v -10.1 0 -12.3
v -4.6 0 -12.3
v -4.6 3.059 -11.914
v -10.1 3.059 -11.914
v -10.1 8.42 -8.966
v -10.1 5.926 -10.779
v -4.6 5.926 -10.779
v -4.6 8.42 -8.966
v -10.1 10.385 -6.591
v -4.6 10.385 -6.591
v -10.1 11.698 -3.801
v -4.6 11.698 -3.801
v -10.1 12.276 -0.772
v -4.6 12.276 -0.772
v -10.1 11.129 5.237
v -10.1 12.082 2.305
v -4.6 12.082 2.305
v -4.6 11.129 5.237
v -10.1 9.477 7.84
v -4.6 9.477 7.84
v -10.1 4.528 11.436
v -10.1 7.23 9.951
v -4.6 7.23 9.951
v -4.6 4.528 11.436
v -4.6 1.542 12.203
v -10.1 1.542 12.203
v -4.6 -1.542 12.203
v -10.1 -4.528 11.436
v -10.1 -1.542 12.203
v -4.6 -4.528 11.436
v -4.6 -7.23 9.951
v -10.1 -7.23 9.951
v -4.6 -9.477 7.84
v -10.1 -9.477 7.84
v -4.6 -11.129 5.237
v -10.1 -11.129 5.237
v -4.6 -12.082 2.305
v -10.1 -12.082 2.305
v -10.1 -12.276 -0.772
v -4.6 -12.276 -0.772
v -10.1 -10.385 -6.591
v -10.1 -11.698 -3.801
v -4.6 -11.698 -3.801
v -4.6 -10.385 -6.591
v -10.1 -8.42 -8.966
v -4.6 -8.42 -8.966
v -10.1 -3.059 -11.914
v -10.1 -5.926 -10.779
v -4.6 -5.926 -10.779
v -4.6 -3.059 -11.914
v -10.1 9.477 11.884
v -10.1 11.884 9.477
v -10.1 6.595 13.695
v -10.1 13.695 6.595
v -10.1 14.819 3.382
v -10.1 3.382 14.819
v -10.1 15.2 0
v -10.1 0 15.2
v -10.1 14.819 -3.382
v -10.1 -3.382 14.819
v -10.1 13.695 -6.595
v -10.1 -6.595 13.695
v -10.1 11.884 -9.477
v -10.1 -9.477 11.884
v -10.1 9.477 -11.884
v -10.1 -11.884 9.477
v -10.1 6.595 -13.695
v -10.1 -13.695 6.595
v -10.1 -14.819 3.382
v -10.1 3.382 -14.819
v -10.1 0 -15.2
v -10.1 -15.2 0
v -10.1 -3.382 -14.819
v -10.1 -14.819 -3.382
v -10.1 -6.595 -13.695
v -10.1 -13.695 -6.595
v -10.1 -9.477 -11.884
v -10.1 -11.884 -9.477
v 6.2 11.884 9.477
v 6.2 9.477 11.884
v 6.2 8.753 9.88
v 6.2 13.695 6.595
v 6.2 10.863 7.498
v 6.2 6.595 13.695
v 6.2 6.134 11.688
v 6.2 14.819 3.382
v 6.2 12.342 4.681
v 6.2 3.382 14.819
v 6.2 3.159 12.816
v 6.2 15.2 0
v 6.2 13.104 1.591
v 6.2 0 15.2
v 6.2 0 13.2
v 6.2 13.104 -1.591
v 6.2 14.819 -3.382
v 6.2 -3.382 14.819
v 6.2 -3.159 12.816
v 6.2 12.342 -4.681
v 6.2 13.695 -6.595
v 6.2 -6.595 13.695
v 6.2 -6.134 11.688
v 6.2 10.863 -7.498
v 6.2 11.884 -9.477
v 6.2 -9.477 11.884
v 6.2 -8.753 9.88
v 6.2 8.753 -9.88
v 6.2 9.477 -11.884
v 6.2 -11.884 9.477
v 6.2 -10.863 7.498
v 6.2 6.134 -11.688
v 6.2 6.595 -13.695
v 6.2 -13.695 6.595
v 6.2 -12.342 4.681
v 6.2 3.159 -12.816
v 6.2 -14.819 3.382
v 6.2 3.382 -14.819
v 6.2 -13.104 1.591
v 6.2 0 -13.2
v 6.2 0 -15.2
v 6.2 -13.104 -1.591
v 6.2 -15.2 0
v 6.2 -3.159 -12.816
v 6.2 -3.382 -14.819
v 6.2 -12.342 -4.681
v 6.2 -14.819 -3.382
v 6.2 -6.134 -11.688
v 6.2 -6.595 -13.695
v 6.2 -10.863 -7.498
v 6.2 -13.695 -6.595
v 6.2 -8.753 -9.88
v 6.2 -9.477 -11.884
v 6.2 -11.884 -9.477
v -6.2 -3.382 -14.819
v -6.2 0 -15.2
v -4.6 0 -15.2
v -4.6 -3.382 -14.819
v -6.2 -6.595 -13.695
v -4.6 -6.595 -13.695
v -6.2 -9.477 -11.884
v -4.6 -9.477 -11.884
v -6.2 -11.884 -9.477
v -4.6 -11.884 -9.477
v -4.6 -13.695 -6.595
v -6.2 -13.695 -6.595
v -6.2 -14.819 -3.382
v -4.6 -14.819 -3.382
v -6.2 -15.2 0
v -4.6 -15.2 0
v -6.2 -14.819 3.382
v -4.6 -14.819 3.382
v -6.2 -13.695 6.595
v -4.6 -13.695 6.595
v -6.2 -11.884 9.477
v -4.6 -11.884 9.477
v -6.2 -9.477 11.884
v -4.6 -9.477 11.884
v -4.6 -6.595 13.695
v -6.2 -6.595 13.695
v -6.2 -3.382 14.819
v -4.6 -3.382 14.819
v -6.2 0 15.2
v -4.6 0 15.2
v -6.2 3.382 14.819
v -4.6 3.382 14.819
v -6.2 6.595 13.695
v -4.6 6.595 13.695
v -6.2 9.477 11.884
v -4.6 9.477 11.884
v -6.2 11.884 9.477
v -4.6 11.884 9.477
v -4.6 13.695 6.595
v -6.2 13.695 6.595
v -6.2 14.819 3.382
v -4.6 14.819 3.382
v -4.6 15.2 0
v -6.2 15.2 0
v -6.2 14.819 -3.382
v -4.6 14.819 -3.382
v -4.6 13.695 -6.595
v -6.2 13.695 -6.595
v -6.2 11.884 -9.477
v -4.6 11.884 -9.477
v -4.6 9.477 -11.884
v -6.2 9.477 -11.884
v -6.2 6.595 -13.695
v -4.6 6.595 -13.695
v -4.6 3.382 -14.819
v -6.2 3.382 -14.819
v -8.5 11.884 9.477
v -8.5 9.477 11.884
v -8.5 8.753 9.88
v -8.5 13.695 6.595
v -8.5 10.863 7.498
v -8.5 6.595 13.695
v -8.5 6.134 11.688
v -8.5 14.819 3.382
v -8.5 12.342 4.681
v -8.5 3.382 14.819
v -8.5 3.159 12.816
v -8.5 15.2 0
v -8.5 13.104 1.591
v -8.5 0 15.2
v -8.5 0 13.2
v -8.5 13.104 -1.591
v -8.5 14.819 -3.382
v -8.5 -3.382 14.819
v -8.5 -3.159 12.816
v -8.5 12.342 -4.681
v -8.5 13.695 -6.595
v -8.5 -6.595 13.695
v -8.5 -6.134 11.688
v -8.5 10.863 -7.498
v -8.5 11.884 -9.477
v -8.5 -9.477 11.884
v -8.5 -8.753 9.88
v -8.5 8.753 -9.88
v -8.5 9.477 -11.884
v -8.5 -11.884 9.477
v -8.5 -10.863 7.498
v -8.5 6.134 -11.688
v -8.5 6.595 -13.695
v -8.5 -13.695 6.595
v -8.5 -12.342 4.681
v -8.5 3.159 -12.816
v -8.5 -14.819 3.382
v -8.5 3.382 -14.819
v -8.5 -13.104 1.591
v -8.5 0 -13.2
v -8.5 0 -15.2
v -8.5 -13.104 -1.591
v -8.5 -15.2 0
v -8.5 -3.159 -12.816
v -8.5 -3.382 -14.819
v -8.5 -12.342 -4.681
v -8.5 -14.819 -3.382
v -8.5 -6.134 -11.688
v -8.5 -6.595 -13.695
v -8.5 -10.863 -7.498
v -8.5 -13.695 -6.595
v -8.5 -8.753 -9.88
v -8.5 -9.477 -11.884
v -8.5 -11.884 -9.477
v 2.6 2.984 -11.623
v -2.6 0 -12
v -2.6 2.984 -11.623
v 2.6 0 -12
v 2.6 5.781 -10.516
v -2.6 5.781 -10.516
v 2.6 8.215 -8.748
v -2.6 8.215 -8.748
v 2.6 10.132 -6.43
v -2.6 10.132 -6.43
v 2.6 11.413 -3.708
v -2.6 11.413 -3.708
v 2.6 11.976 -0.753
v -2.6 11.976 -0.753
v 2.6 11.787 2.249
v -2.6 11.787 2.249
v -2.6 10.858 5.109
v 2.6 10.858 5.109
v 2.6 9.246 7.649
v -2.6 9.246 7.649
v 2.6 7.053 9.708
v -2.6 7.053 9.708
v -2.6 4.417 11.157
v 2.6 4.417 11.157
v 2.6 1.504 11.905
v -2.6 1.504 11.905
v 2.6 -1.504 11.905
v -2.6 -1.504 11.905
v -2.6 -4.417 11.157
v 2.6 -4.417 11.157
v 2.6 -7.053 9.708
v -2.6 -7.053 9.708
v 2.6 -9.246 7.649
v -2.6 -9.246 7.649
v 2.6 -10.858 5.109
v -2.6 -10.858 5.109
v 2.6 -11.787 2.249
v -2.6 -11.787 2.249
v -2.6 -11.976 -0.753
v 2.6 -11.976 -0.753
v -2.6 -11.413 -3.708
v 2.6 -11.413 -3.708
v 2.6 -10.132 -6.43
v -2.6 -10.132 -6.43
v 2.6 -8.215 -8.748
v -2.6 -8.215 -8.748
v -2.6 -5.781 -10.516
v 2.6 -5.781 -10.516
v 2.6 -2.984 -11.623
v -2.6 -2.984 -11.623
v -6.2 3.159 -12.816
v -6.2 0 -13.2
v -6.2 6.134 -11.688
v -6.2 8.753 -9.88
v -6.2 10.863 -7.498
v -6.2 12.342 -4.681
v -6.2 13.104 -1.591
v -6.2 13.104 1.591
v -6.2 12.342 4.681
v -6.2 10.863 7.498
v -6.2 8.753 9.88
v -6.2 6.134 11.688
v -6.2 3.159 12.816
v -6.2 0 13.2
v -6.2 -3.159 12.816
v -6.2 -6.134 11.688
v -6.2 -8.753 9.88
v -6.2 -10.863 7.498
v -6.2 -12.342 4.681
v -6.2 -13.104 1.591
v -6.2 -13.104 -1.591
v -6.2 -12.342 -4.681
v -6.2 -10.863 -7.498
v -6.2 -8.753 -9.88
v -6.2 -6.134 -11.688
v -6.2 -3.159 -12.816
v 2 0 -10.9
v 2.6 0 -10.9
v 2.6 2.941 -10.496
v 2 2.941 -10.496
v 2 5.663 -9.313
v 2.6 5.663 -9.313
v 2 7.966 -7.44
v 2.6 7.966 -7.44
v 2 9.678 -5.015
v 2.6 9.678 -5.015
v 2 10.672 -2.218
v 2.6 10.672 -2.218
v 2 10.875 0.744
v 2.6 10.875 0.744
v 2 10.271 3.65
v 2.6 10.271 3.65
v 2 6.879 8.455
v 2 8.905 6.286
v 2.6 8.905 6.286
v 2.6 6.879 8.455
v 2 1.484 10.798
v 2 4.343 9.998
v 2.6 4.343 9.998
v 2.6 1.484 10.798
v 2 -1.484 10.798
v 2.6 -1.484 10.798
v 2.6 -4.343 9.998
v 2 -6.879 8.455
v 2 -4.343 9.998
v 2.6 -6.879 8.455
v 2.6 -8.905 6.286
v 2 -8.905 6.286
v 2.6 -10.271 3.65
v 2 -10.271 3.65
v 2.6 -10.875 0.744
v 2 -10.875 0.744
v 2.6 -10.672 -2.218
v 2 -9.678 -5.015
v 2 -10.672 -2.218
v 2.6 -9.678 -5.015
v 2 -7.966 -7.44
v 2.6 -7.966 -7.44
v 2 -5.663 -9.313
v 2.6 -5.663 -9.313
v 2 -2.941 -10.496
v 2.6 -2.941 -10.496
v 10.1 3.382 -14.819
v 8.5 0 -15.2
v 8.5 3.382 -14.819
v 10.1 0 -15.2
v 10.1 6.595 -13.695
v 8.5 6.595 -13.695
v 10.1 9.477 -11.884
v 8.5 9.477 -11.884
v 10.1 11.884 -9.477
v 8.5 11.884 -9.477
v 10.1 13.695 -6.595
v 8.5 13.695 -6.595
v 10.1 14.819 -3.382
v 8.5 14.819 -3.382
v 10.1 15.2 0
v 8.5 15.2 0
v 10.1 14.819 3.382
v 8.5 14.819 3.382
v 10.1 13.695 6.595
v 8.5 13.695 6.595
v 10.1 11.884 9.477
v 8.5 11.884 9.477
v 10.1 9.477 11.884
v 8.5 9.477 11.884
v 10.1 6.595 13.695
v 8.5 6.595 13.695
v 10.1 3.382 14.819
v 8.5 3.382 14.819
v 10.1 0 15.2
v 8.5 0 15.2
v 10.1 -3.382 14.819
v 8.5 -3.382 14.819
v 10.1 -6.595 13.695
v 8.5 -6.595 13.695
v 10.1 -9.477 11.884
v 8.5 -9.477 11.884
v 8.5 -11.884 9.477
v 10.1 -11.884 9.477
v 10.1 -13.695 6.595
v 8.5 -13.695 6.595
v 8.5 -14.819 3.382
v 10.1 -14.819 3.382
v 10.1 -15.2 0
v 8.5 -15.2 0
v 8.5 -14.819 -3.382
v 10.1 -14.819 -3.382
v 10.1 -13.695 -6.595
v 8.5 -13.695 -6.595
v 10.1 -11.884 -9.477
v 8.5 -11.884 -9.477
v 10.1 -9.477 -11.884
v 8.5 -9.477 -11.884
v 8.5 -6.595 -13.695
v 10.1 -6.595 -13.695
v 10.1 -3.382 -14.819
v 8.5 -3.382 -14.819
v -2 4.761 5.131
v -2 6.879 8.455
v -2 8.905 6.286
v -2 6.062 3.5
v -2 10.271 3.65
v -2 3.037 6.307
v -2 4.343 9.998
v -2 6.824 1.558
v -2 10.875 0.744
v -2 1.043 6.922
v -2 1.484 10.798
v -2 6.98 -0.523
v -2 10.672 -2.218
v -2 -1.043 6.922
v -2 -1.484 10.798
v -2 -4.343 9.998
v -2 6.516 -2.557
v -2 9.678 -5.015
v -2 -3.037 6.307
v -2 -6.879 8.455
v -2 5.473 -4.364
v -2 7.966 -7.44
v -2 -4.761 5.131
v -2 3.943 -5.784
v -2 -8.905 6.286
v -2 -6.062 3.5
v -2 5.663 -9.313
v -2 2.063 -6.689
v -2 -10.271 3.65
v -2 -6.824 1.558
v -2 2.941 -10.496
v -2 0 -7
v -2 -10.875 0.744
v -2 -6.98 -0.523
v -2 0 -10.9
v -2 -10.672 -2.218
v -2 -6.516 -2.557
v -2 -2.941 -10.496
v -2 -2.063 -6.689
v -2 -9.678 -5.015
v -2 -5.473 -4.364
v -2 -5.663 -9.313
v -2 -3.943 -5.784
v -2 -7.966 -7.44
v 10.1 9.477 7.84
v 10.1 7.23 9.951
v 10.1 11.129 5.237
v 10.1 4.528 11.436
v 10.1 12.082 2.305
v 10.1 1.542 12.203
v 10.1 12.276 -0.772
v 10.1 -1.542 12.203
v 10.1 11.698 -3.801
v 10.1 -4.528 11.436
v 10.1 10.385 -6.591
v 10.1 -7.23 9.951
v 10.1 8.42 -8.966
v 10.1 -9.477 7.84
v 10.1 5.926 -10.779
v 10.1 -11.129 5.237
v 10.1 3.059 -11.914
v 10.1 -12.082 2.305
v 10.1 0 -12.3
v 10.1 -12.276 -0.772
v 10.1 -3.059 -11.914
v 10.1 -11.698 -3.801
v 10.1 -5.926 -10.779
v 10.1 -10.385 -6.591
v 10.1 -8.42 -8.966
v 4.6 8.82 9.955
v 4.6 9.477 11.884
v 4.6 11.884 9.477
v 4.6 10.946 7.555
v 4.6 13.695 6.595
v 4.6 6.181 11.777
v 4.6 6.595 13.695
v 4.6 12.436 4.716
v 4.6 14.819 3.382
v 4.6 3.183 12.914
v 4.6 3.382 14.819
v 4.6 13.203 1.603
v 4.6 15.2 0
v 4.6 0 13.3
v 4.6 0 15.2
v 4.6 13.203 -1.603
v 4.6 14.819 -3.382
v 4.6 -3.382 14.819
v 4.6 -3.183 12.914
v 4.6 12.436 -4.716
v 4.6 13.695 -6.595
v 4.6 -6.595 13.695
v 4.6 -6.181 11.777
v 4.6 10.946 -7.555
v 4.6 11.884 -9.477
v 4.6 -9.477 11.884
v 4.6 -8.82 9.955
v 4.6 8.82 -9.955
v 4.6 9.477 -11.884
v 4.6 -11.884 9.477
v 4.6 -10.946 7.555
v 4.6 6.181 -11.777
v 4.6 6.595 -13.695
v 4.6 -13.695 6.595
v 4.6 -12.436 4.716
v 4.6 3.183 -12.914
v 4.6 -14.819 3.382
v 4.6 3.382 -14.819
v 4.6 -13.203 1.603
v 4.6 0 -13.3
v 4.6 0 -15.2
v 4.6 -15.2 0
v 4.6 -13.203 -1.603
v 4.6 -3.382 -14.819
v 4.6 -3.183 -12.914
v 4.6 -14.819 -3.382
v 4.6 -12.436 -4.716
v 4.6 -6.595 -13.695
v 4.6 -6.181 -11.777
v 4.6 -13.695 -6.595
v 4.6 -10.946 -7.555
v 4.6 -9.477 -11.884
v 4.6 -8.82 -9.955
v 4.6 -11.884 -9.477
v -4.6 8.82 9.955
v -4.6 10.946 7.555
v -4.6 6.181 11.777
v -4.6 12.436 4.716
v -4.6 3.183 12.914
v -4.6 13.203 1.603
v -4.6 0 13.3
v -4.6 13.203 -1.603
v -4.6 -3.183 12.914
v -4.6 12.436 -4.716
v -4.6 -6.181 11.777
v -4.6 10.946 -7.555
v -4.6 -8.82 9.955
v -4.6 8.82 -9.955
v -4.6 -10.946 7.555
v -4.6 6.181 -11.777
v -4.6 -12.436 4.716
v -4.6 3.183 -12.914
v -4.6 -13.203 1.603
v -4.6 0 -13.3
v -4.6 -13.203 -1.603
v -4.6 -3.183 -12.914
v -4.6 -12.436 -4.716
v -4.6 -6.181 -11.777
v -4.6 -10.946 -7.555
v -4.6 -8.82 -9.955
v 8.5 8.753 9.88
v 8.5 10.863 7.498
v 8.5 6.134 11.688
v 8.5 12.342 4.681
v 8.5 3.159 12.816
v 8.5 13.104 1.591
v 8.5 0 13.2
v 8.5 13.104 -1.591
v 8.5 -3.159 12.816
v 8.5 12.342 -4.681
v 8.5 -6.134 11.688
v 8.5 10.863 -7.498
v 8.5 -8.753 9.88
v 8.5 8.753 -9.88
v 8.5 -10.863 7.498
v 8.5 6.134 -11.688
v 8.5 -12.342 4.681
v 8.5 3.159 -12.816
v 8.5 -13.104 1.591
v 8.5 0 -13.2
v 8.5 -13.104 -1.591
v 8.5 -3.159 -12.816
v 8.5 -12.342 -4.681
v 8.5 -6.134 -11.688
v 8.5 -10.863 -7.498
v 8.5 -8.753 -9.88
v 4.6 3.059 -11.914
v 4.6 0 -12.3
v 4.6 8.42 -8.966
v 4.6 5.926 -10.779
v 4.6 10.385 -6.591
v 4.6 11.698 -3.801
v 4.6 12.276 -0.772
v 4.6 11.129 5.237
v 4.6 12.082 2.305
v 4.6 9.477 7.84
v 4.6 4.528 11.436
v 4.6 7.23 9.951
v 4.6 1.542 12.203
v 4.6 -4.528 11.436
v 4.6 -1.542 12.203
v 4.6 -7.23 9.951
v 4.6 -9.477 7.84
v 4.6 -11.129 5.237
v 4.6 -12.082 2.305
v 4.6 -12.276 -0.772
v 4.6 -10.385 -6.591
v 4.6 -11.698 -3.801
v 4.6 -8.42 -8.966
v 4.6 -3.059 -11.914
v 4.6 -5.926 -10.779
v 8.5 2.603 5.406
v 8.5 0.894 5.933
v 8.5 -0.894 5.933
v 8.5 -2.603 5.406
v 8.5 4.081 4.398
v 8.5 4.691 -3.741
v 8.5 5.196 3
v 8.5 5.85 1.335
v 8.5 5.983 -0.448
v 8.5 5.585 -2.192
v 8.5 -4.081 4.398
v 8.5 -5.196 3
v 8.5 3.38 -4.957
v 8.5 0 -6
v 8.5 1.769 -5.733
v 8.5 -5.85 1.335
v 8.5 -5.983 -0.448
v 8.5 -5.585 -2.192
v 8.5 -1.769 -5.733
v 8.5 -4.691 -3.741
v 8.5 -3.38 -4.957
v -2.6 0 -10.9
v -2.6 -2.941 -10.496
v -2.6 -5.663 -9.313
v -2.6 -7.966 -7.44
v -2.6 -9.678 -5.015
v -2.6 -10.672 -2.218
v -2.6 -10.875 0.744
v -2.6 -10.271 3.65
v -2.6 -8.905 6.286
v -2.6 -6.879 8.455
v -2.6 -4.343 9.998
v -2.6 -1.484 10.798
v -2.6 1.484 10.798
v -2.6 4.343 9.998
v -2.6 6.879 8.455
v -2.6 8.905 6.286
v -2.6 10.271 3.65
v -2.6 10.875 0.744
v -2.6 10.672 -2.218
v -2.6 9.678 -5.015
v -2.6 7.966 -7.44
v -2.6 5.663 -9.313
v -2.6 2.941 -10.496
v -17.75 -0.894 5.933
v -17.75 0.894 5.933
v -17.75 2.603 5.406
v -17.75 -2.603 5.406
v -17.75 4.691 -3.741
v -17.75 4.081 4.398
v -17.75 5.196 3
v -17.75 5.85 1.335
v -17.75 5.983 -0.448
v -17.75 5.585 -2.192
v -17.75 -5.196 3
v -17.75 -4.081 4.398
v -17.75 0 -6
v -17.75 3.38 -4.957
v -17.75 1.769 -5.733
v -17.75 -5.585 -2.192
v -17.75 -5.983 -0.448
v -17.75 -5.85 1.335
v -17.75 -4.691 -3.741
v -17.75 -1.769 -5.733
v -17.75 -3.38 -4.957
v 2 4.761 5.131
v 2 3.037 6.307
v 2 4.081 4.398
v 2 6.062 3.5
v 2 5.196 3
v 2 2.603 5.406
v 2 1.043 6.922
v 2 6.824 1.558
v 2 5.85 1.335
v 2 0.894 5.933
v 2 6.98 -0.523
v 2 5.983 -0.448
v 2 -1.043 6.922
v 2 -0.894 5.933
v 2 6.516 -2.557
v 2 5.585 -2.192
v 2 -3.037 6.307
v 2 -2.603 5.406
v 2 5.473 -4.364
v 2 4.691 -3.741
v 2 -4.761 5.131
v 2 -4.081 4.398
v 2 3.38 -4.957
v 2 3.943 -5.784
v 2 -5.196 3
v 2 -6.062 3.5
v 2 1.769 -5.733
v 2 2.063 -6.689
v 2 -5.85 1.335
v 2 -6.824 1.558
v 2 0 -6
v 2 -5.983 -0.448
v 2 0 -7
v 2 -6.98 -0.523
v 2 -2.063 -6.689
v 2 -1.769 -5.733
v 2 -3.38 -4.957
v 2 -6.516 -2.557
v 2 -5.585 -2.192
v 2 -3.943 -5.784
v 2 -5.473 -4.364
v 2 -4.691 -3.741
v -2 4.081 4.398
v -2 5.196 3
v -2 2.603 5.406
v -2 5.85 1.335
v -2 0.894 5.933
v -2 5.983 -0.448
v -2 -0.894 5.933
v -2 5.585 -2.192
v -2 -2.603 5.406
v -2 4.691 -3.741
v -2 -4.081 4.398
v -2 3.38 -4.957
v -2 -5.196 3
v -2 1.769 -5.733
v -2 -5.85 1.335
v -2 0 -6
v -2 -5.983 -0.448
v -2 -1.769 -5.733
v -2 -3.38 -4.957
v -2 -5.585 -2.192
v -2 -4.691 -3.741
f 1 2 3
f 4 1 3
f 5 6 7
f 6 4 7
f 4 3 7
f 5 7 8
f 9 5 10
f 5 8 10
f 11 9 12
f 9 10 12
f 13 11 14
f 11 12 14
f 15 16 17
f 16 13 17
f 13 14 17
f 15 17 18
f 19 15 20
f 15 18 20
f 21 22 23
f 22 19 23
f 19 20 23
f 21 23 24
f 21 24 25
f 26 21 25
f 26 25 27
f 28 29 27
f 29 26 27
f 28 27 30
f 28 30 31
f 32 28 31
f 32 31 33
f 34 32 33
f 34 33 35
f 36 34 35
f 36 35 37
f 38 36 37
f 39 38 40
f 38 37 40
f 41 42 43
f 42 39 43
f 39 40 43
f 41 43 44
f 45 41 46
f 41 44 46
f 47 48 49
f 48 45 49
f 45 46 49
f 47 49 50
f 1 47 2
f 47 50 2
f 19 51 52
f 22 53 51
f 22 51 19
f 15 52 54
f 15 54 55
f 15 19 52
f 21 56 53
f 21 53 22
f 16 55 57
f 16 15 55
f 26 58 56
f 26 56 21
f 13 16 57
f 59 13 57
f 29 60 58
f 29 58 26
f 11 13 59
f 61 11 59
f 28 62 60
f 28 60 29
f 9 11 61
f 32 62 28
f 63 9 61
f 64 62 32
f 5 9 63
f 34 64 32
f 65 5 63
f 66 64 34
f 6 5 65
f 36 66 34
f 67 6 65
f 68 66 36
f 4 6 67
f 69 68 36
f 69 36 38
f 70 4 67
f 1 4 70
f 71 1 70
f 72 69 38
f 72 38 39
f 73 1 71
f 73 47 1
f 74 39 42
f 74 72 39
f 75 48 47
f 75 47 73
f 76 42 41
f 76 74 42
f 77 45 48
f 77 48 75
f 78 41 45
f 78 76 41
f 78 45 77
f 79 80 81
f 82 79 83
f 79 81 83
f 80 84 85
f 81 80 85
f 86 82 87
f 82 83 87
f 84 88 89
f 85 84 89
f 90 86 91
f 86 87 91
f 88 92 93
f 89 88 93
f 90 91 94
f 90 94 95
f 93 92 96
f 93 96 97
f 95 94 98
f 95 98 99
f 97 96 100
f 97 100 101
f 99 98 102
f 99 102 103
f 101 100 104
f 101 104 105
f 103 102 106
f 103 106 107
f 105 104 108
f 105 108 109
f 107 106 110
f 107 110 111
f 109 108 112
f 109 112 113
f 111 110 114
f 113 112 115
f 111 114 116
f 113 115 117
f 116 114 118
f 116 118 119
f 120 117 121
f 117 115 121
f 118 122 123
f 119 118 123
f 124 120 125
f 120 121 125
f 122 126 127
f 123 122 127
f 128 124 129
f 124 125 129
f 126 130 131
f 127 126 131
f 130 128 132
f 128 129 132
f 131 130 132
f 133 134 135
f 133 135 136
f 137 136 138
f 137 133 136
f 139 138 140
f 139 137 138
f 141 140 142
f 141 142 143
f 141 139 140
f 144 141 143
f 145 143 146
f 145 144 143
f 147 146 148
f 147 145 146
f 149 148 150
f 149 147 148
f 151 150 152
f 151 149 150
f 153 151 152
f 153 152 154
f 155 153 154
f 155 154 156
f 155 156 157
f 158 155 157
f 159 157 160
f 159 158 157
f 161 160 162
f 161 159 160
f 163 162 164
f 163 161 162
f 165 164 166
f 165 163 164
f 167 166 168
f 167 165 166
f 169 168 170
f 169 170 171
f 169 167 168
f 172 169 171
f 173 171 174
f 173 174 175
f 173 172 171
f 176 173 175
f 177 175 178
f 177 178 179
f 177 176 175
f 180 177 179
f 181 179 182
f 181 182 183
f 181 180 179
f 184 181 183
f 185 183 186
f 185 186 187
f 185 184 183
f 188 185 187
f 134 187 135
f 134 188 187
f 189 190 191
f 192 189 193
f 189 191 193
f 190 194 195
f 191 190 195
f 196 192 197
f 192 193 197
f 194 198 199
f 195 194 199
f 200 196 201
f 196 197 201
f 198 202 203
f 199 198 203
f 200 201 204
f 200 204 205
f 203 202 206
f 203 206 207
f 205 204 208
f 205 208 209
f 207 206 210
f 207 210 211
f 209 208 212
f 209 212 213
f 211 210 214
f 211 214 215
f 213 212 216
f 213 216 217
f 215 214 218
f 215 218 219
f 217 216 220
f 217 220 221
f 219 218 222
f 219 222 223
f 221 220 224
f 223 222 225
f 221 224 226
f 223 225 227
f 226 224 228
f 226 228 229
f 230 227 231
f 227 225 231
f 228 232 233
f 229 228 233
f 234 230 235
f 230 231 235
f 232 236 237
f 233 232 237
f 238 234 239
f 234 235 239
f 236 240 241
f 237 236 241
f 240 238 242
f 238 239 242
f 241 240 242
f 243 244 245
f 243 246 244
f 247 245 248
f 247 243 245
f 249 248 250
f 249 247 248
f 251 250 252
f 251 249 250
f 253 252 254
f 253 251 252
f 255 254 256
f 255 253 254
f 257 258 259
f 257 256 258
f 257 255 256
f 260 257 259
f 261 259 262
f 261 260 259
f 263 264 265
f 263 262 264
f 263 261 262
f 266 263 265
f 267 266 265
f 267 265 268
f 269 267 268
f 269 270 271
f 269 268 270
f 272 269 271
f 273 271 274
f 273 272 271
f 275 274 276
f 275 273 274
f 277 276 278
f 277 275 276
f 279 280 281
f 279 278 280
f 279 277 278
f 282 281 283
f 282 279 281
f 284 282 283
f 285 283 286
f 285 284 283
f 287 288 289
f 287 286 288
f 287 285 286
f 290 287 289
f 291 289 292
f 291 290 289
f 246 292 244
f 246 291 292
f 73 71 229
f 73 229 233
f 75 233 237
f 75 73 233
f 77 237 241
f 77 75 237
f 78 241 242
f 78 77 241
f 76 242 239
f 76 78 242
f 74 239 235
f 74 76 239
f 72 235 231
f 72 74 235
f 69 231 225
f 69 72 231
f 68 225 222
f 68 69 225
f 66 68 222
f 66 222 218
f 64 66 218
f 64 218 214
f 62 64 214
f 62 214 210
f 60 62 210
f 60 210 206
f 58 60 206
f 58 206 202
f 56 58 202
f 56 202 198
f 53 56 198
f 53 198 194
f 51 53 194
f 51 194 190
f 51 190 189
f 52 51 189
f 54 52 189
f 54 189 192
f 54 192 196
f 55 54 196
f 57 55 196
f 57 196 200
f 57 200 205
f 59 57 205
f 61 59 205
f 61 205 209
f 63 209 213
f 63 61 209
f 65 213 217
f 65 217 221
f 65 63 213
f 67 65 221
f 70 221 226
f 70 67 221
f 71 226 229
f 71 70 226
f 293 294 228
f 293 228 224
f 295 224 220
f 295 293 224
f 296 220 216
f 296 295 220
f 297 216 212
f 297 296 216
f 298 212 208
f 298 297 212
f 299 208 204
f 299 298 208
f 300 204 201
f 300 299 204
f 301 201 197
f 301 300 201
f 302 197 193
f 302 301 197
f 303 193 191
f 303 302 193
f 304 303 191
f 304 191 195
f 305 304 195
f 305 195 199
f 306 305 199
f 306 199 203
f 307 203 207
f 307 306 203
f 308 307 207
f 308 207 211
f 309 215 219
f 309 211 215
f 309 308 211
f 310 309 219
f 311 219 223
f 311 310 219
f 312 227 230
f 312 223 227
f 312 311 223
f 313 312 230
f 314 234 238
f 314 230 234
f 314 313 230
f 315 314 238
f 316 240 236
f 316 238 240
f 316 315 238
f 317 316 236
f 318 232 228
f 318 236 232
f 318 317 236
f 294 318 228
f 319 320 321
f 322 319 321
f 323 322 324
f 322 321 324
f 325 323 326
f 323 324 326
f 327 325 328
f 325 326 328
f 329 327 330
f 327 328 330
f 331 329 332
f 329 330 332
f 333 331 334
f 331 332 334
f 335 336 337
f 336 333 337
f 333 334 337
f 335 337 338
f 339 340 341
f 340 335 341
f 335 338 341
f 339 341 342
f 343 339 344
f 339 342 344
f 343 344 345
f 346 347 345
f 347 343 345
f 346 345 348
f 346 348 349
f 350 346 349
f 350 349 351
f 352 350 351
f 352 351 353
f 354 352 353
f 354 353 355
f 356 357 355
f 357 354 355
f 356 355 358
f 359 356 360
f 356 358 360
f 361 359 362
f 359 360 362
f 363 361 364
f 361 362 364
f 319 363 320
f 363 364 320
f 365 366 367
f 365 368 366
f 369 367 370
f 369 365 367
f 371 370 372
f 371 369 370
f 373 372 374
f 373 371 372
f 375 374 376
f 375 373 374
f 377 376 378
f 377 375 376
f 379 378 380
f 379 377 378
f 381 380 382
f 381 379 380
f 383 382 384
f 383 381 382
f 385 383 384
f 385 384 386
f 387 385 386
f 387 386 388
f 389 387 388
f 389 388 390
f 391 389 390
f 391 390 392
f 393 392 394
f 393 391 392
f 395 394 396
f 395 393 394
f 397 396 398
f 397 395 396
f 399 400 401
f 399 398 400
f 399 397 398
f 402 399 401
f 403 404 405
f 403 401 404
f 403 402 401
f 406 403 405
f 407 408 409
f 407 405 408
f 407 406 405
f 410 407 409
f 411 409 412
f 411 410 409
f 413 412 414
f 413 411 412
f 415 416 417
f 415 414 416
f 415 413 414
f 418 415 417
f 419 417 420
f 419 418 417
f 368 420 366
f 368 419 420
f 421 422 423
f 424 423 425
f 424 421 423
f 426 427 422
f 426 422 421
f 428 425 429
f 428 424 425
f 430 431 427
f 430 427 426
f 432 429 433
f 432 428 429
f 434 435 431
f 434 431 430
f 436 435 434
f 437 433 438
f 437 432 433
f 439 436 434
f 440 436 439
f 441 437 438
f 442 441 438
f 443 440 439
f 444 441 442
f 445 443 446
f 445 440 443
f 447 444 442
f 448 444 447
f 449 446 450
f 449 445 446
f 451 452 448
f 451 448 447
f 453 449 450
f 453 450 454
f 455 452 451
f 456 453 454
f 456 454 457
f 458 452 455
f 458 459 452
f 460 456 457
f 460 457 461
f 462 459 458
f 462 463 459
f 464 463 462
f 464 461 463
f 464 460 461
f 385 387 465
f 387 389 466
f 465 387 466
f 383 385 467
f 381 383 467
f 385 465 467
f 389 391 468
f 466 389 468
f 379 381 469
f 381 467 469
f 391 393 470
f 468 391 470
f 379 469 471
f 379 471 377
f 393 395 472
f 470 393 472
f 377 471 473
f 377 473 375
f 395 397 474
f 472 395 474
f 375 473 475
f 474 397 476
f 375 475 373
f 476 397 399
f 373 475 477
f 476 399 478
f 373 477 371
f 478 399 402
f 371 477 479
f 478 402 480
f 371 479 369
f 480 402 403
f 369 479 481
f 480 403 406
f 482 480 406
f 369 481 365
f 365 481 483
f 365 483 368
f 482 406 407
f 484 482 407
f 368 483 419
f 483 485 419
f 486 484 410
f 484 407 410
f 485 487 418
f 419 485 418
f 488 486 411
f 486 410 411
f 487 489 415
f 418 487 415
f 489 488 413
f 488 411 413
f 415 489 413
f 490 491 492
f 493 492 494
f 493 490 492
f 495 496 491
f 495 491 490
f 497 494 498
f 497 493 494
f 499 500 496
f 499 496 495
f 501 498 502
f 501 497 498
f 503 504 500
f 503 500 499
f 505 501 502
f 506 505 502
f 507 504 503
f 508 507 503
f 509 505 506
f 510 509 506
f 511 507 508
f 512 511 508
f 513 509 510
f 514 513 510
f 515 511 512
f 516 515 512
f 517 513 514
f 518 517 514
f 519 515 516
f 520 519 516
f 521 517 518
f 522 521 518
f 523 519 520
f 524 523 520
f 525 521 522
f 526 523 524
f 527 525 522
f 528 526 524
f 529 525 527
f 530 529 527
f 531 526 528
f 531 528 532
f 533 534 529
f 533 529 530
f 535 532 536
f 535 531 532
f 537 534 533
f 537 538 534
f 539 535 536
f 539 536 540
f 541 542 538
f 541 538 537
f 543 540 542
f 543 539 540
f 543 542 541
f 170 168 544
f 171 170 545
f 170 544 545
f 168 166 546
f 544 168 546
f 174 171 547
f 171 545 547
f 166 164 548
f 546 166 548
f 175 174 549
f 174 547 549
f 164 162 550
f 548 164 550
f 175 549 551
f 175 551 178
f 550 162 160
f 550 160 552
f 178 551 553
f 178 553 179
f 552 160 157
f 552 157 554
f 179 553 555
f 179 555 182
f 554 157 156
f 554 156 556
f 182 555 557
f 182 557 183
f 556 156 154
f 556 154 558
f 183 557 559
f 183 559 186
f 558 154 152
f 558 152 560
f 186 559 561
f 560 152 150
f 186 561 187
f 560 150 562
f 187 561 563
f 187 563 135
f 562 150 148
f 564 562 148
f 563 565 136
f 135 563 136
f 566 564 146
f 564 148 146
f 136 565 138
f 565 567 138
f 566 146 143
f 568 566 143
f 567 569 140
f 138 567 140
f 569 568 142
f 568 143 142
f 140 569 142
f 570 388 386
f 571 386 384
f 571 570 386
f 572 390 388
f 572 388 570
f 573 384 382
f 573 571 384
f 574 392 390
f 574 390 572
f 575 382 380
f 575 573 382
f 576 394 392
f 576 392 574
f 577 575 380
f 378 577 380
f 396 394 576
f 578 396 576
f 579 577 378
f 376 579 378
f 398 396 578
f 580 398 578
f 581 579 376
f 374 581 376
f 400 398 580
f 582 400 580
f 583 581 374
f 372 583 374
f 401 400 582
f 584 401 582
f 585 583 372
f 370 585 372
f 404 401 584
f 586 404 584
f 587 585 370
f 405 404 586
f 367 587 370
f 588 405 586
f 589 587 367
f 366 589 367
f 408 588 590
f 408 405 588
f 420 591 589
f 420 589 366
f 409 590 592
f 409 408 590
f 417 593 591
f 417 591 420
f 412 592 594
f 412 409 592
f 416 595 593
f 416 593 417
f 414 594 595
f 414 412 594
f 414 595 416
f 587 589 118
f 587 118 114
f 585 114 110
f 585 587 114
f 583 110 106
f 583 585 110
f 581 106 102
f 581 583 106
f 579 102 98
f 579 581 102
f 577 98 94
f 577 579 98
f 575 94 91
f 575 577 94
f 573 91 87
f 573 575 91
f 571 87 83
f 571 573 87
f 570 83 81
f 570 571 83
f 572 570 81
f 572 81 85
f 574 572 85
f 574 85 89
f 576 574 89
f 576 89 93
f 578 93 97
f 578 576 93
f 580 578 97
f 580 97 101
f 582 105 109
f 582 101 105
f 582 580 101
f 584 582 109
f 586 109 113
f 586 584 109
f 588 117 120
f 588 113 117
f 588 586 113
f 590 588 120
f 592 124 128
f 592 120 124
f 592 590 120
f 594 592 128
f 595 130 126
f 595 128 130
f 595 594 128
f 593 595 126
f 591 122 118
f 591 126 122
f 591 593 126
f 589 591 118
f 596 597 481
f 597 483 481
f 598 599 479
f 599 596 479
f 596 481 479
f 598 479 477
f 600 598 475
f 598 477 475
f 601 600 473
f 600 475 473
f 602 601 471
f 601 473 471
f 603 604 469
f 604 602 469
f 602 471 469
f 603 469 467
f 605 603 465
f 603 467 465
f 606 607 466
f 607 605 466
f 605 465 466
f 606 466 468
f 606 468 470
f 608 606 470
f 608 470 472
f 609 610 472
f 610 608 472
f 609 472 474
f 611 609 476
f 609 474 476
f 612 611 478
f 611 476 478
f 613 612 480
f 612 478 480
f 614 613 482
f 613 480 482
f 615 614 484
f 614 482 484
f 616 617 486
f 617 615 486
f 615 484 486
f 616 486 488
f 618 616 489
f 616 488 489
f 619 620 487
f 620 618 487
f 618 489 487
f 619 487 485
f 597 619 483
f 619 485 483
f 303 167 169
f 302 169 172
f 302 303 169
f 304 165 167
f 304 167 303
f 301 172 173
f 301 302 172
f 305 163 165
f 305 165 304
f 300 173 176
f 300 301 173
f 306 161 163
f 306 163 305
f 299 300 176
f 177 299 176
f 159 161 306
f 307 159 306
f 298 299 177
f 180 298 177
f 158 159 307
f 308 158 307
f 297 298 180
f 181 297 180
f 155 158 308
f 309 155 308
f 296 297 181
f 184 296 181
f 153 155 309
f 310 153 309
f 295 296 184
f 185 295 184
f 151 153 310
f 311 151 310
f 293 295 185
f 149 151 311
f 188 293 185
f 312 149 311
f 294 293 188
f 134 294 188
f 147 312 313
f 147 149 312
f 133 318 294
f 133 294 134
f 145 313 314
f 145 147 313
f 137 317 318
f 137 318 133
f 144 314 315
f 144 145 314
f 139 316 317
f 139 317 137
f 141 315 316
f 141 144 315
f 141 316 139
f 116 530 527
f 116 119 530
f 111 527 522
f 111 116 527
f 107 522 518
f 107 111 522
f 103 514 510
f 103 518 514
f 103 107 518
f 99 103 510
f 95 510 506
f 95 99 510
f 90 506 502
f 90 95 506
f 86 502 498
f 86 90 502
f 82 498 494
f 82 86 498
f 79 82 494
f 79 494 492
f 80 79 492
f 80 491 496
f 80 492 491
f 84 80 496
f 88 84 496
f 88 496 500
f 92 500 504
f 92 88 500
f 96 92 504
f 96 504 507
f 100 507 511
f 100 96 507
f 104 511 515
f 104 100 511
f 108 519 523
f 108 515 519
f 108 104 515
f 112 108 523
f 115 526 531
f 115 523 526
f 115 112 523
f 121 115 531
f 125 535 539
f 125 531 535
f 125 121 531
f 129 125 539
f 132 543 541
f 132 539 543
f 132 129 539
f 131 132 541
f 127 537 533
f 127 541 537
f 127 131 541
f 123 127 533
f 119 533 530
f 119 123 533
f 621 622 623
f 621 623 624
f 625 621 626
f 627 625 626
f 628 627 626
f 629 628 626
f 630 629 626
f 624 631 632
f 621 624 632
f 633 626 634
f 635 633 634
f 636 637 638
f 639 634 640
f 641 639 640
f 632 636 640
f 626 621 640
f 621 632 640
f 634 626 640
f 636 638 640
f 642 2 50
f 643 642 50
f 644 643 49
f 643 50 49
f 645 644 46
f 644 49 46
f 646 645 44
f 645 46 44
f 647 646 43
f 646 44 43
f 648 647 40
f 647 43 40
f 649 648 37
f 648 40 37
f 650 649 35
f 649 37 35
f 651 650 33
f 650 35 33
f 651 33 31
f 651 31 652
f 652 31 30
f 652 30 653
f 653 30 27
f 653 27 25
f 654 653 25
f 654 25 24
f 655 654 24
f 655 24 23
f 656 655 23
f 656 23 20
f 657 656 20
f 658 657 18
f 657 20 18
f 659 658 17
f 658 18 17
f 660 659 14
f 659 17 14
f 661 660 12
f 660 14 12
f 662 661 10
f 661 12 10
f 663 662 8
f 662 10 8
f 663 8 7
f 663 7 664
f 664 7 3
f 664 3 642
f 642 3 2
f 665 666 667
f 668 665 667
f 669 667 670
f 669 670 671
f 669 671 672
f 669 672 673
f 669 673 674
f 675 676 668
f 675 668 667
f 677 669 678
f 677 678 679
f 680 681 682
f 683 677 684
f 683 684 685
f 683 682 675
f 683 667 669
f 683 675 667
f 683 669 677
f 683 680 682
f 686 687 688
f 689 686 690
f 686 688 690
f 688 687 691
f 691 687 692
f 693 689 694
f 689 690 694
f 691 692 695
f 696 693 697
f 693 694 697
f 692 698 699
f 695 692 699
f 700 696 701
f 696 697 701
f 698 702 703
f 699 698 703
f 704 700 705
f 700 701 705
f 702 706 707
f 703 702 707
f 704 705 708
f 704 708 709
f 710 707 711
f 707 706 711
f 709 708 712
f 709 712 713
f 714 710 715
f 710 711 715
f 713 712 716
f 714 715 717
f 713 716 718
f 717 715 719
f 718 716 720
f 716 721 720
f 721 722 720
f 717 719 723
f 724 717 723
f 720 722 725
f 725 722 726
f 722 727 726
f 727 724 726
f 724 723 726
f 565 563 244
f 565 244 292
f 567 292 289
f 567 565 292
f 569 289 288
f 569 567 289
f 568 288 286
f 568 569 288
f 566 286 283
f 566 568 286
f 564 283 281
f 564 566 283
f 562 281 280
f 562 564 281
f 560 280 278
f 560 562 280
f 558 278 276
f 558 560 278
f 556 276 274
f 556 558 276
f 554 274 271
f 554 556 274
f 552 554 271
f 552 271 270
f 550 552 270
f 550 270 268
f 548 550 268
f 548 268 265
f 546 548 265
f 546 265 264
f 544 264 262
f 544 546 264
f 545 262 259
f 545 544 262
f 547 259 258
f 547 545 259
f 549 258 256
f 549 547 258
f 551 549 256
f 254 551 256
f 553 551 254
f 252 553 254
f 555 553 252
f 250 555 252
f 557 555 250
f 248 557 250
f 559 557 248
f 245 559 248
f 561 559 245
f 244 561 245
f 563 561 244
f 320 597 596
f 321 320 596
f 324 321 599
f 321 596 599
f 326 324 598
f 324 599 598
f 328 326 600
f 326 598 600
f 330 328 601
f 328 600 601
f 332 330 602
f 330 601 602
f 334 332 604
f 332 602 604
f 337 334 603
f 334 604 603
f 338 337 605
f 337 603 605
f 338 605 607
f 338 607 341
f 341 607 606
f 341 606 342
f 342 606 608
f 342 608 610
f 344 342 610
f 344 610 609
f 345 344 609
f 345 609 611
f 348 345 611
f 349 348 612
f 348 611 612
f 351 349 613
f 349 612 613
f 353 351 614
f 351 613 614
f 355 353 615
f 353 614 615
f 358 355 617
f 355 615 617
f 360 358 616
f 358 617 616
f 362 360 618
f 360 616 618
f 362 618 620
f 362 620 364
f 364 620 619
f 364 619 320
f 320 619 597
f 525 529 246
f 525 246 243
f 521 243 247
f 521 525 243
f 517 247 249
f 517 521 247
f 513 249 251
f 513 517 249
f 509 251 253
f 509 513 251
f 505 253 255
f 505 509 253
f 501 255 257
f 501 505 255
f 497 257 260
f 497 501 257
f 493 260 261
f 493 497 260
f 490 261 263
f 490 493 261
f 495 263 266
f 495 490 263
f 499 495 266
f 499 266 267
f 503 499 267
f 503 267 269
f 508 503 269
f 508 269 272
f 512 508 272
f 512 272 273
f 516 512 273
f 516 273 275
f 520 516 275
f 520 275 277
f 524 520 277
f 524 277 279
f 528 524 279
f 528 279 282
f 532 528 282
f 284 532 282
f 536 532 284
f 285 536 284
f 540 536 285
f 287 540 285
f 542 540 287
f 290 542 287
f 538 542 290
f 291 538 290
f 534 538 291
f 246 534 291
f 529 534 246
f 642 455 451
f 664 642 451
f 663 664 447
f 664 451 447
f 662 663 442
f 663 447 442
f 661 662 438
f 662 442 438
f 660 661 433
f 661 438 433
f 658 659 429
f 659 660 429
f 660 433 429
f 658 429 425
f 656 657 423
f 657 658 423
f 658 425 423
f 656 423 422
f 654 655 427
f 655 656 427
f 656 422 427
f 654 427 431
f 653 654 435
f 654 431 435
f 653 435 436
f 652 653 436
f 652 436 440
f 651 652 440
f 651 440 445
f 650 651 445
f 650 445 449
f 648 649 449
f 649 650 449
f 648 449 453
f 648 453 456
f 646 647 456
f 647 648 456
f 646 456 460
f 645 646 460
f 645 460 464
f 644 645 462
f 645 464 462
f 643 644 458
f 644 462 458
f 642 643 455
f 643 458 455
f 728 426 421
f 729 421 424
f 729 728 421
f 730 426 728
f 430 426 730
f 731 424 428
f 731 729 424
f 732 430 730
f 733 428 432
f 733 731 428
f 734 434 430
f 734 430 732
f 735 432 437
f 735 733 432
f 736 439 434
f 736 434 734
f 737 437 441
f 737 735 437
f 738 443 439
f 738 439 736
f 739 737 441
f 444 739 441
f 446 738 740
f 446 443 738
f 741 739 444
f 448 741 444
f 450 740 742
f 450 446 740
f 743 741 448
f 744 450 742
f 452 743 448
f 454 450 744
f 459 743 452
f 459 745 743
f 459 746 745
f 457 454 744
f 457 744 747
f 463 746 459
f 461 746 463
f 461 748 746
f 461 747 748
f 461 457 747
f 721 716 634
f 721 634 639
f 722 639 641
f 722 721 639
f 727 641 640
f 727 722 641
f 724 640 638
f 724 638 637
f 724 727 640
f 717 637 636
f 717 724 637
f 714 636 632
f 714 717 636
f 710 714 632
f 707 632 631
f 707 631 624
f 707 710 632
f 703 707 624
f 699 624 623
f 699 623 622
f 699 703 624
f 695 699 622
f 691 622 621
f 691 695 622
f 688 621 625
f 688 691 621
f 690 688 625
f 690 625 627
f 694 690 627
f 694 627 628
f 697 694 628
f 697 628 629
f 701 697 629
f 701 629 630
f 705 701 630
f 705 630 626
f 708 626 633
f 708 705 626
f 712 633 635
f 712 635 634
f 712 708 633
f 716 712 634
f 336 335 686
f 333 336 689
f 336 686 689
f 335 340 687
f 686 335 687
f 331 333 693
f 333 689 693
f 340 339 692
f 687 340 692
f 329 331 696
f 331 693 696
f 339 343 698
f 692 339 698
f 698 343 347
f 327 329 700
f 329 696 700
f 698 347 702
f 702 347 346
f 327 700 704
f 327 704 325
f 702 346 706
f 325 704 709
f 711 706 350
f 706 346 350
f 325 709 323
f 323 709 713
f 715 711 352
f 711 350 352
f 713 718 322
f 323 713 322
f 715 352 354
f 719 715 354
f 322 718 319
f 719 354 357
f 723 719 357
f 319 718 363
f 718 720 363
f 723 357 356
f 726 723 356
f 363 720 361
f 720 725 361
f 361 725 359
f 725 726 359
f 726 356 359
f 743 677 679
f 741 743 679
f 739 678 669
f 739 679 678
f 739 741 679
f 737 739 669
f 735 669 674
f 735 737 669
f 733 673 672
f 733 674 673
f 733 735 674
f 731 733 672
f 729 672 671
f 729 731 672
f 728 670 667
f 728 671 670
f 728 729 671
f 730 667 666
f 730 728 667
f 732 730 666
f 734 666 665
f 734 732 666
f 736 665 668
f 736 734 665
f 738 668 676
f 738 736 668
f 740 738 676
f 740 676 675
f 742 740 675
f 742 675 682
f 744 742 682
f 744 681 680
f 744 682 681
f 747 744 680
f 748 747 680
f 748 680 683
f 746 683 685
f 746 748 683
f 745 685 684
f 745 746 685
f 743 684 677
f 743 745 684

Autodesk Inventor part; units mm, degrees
ref_plane "YZ Plane" through (0, 0, 0) normal (1, 0, 0) x (0, 1, 0)
ref_plane "XZ Plane" through (0, 0, 0) normal (0, 1, 0) x (-1, 0, 0)
ref_plane "XY Plane" through (0, 0, 0) normal (0, 0, 1) x (1, 0, 0)
sketch "Sketch1" plane through (0, 0, 0) normal (0, 1, 0) x (-1, 0, 0)
  line L0 (0, 0) -> (10.1, 0) construction
  line L1 (10.1, 0) -> (10.1, -10.9) construction
  line L2 (10.1, -10.9) -> (0, -10.9) construction
  line L3 (0, -10.9) -> (0, 0) construction
  line L4 (10.1, 0) -> (4.6, 0) construction
  line L5 (4.6, 0) -> (4.6, -12.3) construction
  line L6 (4.6, -12.3) -> (10.1, -12.3) construction
  line L7 (10.1, -12.3) -> (10.1, 0) construction
  line L8 (4.6, -10.9) -> (2.6, -10.9) construction
  line L9 (2.6, -10.9) -> (4.6, -12.3) construction
  line L10 (0, 0) -> (17.75, 0) construction
  line L11 (17.75, 0) -> (17.75, -6) construction
  line L12 (17.75, -6) -> (0, -6) construction
  line L13 (0, -6) -> (0, 0) construction
  line L14 (10.1, 0) -> (8.5, 0) construction
  line L15 (8.5, 0) -> (8.5, -15.2) construction
  line L16 (8.5, -15.2) -> (10.1, -15.2) construction
  line L17 (10.1, -15.2) -> (10.1, 0) construction
  line L18 (8.5, 0) -> (6.2, 0) construction
  line L19 (6.2, 0) -> (6.2, -13.2) construction
  line L20 (6.2, -13.2) -> (8.5, -13.2) construction
  line L21 (8.5, -13.2) -> (8.5, 0) construction
  line L22 (0, 0) -> (0, -12) construction
  line L23 (0, -12) -> (2.6, -12) construction
  line L24 (6.2, 0) -> (4.6, 0) construction
  line L25 (4.6, 0) -> (4.6, -15.2) construction
  line L26 (4.6, -15.2) -> (6.2, -15.2) construction
  line L27 (6.2, -15.2) -> (6.2, 0) construction
  line L28 (4.6, -15.2) -> (4.6, -13.3) construction
  line L29 (4.6, -13.3) -> (2.6, -12) construction
  line L30 (0, 0) -> (-10.1, 0) construction
  line L31 (-10.1, 0) -> (-10.1, -10.9) construction
  line L32 (-10.1, -10.9) -> (0, -10.9) construction
  line L33 (-10.1, 0) -> (-4.6, 0) construction
  line L34 (-4.6, 0) -> (-4.6, -12.3) construction
  line L35 (-4.6, -12.3) -> (-10.1, -12.3) construction
  line L36 (-10.1, -12.3) -> (-10.1, 0) construction
  line L37 (-4.6, -10.9) -> (-2.6, -10.9) construction
  line L38 (-2.6, -10.9) -> (-4.6, -12.3) construction
  line L39 (-10.1, 0) -> (-8.5, 0) construction
  line L40 (-8.5, 0) -> (-8.5, -15.2) construction
  line L41 (-8.5, -15.2) -> (-10.1, -15.2) construction
  line L42 (-10.1, -15.2) -> (-10.1, 0) construction
  line L43 (-8.5, 0) -> (-6.2, 0) construction
  line L44 (-6.2, 0) -> (-6.2, -13.2) construction
  line L45 (-6.2, -13.2) -> (-8.5, -13.2) construction
  line L46 (-8.5, -13.2) -> (-8.5, 0) construction
  line L47 (0, -12) -> (-2.6, -12) construction
  line L48 (-6.2, 0) -> (-4.6, 0) construction
  line L49 (-4.6, 0) -> (-4.6, -15.2) construction
  line L50 (-4.6, -15.2) -> (-6.2, -15.2) construction
  line L51 (-6.2, -15.2) -> (-6.2, 0) construction
  line L52 (-4.6, -15.2) -> (-4.6, -13.3) construction
  line L53 (-4.6, -13.3) -> (-2.6, -12) construction
  line L54 (0, 0) -> (-2, 0) construction
  line L55 (-2, 0) -> (-2, -10.9) construction
  line L56 (-2, -10.9) -> (0, -10.9) construction
  line L57 (0, -10.9) -> (0, 0) construction
  line L58 (0, 0) -> (2, 0) construction
  line L59 (2, 0) -> (2, -10.9) construction
  line L60 (2, -10.9) -> (0, -10.9) construction
  line L61 (0, -10.9) -> (0, 0) construction
  line L62 (0, -6) -> (-8.5, -6) construction
  line L63 (-8.5, -6) -> (-8.5, 0) construction
  line L64 (-8.5, 0) -> (0, 0) construction
  line L65 (0, 0) -> (0, -6) construction
  line L66 (10.1, -12.3) -> (8.5, -12.3) construction
  line L67 (8.5, -12.3) -> (6.2, -12.3) construction
  line L68 (4.6, -12.3) -> (4.6, -13.3) construction
  line L69 (2.6, -12) -> (2.6, -10.9) construction
  line L70 (-2.6, -10.9) -> (-4.6, -12.3) construction
  line L71 (-6.2, -12.3) -> (-8.5, -12.3) construction
  line L72 (-10.1, -12.3) -> (-10.1, -15.2) construction
  line L73 (-8.5, -15.2) -> (-8.5, -13.2) construction
  line L74 (-6.2, -13.2) -> (-6.2, -15.2) construction
  line L75 (10.1, -12.3) -> (4.6, -12.3) construction
  line L76 (2.6, -10.9) -> (2, -10.9) construction
  line L77 (2, -6) -> (17.75, -6) construction
  line L78 (17.75, 0) -> (-8.5, 0) construction
  line L79 (-8.5, -6) -> (-2, -6) construction
  line L80 (-2, -10.9) -> (-2.6, -10.9) construction
  line L81 (-4.6, -12.3) -> (-10.1, -12.3) construction
  line L82 (-10.1, -15.2) -> (-8.5, -15.2) construction
  line L83 (17.75, 0) -> (17.75, -6)
  line L84 (2, -6) -> (2, -10.9)
  line L85 (2.6, -10.9) -> (4.6, -12.3)
  line L86 (10.1, -12.3) -> (10.1, -15.2)
  line L87 (8.5, -15.2) -> (8.5, -13.2)
  line L88 (6.2, -13.2) -> (6.2, -15.2)
  line L89 (4.6, -15.2) -> (4.6, -13.3)
  line L90 (2.6, -12) -> (-2.6, -12)
  line L91 (-4.6, -13.3) -> (-4.6, -15.2)
  line L92 (-6.2, -15.2) -> (-6.2, -13.2)
  line L93 (-8.5, -13.2) -> (-8.5, -15.2)
  line L94 (-10.1, -15.2) -> (-10.1, -12.3)
  line L95 (-6.2, -13.2) -> (-8.5, -13.2)
  line L96 (-2.6, -12) -> (-4.6, -13.3)
  line L97 (-4.6, -12.3) -> (-10.1, -12.3)
  line L98 (4.6, -13.3) -> (2.6, -12)
  line L99 (4.6, -15.2) -> (6.2, -15.2)
  line L100 (-4.6, -12.3) -> (-2.6, -10.9)
  line L101 (-2, -10.9) -> (-2.6, -10.9)
  line L102 (-2, -6) -> (-2, -10.9)
  line L103 (8.5, -13.2) -> (6.2, -13.2)
  line L104 (8.5, -15.2) -> (10.1, -15.2)
  line L105 (10.1, -12.3) -> (4.6, -12.3)
  line L106 (17.75, -6) -> (2, -6)
  line L107 (17.75, 0) -> (-8.5, 0)
  line L108 (-8.5, -6) -> (-8.5, 0)
  line L109 (-8.5, -6) -> (-2, -6)
  line L110 (-4.6, -15.2) -> (-6.2, -15.2)
  line L111 (-8.5, -15.2) -> (-10.1, -15.2)
  line L112 (-2, -6) -> (-8.5, -6)
  line L113 (-8.5, -6) -> (-8.5, -7)
  line L114 (-8.5, -7) -> (-2, -7)
  line L115 (-2, -7) -> (-2, -6)
  line L116 (2, -6) -> (17.75, -6)
  line L117 (17.75, -6) -> (17.75, -7)
  line L118 (17.75, -7) -> (2, -7)
  line L119 (2, -7) -> (2, -6)
  line L120 (2.6, -10.9) -> (2, -10.9)
  dimension "d0" = 10.1
  dimension "d1" = 10.9
  dimension "d2" = 5.5
  dimension "d3" = 12.3
  dimension "d4" = 2
  dimension "d5" = 17.75
  dimension "d6" = 6
  dimension "d7" = 1.6
  dimension "d8" = 15.2
  dimension "d9" = 2.3
  dimension "d10" = 13.2
  dimension "d12" = 12
  dimension "d13" = 2.6
  dimension "d15" = 15.2
  dimension "d16" = 1.9
  dimension "d17" = 2
  dimension "d18" = 2
  dimension "d19" = 1
  dimension "d20" = 1
revolve "Revolution1" add sketch "Sketch1" angle 360 about axis through (0, 0, 0) along (-1, 0, 0) contours L83 L106 L84 L120 L85 L105 L86 L104 L87 L103 L88 L99 L89 L98 L90 L96 L91 L110 L92 L95 L93 L111 L94 L97 L100 L101 L102 L109 L108 L107
sketch "Sketch2" plane through (0, 0, 0) normal (1, 0, 0) x (0, 1, 0)
  line L0 (0, 0) -> (0, 12)
  circle A0 centre (0, 0) radius 12 projected
  line L1 (0, 12) -> (0, 15.2)
  circle A1 centre (0, 0) radius 15.2 projected
  line L2 (-1.5, 15.2) -> (1.5, 15.2)
  line L3 (-1.5, 15.2) -> (0, 15.2)
  line L4 (0, 15.2) -> (0, 0)
  line L5 (0, 0) -> (-1.5, 0)
  line L6 (-1.5, 0) -> (-1.5, 15.2)
  line L7 (0, 0) -> (1.5, 0)
  line L8 (1.5, 0) -> (1.5, 15.2)
  line L9 (1.5, 15.2) -> (0, 15.2)
  line L10 (0, 15.2) -> (0, 0)
  line L11 (0, 0) -> (-12, 0)
  line L12 (-12, 0) -> (-15.2, 0)
  line L13 (-15.2, -1.5) -> (-15.2, 1.5)
  line L14 (-15.2, -1.5) -> (-15.2, 0)
  line L15 (-15.2, 0) -> (0, 0)
  line L16 (0, 0) -> (0, -1.5)
  line L17 (0, -1.5) -> (-15.2, -1.5)
  line L18 (0, 0) -> (0, 1.5)
  line L19 (0, 1.5) -> (-15.2, 1.5)
  line L20 (-15.2, 1.5) -> (-15.2, 0)
  line L21 (-15.2, 0) -> (0, 0)
  line L22 (0, 0) -> (0, -12)
  line L23 (0, -12) -> (0, -15.2)
  line L24 (1.5, -15.2) -> (-1.5, -15.2)
  line L25 (1.5, -15.2) -> (0, -15.2)
  line L26 (0, -15.2) -> (0, 0)
  line L27 (0, 0) -> (1.5, 0)
  line L28 (1.5, 0) -> (1.5, -15.2)
  line L29 (0, 0) -> (-1.5, 0)
  line L30 (-1.5, 0) -> (-1.5, -15.2)
  line L31 (-1.5, -15.2) -> (0, -15.2)
  line L32 (0, -15.2) -> (0, 0)
  line L33 (0, 0) -> (12, 0)
  line L34 (12, 0) -> (15.2, 0)
  line L35 (15.2, 1.5) -> (15.2, -1.5)
  line L36 (15.2, 1.5) -> (15.2, 0)
  line L37 (15.2, 0) -> (0, 0)
  line L38 (0, 0) -> (0, 1.5)
  line L39 (0, 1.5) -> (15.2, 1.5)
  line L40 (0, 0) -> (0, -1.5)
  line L41 (0, -1.5) -> (15.2, -1.5)
  line L42 (15.2, -1.5) -> (15.2, 0)
  line L43 (15.2, 0) -> (0, 0)
  dimension "d22" = 3
  dimension "d25" = 360
properties part number "Wheel Rim"
